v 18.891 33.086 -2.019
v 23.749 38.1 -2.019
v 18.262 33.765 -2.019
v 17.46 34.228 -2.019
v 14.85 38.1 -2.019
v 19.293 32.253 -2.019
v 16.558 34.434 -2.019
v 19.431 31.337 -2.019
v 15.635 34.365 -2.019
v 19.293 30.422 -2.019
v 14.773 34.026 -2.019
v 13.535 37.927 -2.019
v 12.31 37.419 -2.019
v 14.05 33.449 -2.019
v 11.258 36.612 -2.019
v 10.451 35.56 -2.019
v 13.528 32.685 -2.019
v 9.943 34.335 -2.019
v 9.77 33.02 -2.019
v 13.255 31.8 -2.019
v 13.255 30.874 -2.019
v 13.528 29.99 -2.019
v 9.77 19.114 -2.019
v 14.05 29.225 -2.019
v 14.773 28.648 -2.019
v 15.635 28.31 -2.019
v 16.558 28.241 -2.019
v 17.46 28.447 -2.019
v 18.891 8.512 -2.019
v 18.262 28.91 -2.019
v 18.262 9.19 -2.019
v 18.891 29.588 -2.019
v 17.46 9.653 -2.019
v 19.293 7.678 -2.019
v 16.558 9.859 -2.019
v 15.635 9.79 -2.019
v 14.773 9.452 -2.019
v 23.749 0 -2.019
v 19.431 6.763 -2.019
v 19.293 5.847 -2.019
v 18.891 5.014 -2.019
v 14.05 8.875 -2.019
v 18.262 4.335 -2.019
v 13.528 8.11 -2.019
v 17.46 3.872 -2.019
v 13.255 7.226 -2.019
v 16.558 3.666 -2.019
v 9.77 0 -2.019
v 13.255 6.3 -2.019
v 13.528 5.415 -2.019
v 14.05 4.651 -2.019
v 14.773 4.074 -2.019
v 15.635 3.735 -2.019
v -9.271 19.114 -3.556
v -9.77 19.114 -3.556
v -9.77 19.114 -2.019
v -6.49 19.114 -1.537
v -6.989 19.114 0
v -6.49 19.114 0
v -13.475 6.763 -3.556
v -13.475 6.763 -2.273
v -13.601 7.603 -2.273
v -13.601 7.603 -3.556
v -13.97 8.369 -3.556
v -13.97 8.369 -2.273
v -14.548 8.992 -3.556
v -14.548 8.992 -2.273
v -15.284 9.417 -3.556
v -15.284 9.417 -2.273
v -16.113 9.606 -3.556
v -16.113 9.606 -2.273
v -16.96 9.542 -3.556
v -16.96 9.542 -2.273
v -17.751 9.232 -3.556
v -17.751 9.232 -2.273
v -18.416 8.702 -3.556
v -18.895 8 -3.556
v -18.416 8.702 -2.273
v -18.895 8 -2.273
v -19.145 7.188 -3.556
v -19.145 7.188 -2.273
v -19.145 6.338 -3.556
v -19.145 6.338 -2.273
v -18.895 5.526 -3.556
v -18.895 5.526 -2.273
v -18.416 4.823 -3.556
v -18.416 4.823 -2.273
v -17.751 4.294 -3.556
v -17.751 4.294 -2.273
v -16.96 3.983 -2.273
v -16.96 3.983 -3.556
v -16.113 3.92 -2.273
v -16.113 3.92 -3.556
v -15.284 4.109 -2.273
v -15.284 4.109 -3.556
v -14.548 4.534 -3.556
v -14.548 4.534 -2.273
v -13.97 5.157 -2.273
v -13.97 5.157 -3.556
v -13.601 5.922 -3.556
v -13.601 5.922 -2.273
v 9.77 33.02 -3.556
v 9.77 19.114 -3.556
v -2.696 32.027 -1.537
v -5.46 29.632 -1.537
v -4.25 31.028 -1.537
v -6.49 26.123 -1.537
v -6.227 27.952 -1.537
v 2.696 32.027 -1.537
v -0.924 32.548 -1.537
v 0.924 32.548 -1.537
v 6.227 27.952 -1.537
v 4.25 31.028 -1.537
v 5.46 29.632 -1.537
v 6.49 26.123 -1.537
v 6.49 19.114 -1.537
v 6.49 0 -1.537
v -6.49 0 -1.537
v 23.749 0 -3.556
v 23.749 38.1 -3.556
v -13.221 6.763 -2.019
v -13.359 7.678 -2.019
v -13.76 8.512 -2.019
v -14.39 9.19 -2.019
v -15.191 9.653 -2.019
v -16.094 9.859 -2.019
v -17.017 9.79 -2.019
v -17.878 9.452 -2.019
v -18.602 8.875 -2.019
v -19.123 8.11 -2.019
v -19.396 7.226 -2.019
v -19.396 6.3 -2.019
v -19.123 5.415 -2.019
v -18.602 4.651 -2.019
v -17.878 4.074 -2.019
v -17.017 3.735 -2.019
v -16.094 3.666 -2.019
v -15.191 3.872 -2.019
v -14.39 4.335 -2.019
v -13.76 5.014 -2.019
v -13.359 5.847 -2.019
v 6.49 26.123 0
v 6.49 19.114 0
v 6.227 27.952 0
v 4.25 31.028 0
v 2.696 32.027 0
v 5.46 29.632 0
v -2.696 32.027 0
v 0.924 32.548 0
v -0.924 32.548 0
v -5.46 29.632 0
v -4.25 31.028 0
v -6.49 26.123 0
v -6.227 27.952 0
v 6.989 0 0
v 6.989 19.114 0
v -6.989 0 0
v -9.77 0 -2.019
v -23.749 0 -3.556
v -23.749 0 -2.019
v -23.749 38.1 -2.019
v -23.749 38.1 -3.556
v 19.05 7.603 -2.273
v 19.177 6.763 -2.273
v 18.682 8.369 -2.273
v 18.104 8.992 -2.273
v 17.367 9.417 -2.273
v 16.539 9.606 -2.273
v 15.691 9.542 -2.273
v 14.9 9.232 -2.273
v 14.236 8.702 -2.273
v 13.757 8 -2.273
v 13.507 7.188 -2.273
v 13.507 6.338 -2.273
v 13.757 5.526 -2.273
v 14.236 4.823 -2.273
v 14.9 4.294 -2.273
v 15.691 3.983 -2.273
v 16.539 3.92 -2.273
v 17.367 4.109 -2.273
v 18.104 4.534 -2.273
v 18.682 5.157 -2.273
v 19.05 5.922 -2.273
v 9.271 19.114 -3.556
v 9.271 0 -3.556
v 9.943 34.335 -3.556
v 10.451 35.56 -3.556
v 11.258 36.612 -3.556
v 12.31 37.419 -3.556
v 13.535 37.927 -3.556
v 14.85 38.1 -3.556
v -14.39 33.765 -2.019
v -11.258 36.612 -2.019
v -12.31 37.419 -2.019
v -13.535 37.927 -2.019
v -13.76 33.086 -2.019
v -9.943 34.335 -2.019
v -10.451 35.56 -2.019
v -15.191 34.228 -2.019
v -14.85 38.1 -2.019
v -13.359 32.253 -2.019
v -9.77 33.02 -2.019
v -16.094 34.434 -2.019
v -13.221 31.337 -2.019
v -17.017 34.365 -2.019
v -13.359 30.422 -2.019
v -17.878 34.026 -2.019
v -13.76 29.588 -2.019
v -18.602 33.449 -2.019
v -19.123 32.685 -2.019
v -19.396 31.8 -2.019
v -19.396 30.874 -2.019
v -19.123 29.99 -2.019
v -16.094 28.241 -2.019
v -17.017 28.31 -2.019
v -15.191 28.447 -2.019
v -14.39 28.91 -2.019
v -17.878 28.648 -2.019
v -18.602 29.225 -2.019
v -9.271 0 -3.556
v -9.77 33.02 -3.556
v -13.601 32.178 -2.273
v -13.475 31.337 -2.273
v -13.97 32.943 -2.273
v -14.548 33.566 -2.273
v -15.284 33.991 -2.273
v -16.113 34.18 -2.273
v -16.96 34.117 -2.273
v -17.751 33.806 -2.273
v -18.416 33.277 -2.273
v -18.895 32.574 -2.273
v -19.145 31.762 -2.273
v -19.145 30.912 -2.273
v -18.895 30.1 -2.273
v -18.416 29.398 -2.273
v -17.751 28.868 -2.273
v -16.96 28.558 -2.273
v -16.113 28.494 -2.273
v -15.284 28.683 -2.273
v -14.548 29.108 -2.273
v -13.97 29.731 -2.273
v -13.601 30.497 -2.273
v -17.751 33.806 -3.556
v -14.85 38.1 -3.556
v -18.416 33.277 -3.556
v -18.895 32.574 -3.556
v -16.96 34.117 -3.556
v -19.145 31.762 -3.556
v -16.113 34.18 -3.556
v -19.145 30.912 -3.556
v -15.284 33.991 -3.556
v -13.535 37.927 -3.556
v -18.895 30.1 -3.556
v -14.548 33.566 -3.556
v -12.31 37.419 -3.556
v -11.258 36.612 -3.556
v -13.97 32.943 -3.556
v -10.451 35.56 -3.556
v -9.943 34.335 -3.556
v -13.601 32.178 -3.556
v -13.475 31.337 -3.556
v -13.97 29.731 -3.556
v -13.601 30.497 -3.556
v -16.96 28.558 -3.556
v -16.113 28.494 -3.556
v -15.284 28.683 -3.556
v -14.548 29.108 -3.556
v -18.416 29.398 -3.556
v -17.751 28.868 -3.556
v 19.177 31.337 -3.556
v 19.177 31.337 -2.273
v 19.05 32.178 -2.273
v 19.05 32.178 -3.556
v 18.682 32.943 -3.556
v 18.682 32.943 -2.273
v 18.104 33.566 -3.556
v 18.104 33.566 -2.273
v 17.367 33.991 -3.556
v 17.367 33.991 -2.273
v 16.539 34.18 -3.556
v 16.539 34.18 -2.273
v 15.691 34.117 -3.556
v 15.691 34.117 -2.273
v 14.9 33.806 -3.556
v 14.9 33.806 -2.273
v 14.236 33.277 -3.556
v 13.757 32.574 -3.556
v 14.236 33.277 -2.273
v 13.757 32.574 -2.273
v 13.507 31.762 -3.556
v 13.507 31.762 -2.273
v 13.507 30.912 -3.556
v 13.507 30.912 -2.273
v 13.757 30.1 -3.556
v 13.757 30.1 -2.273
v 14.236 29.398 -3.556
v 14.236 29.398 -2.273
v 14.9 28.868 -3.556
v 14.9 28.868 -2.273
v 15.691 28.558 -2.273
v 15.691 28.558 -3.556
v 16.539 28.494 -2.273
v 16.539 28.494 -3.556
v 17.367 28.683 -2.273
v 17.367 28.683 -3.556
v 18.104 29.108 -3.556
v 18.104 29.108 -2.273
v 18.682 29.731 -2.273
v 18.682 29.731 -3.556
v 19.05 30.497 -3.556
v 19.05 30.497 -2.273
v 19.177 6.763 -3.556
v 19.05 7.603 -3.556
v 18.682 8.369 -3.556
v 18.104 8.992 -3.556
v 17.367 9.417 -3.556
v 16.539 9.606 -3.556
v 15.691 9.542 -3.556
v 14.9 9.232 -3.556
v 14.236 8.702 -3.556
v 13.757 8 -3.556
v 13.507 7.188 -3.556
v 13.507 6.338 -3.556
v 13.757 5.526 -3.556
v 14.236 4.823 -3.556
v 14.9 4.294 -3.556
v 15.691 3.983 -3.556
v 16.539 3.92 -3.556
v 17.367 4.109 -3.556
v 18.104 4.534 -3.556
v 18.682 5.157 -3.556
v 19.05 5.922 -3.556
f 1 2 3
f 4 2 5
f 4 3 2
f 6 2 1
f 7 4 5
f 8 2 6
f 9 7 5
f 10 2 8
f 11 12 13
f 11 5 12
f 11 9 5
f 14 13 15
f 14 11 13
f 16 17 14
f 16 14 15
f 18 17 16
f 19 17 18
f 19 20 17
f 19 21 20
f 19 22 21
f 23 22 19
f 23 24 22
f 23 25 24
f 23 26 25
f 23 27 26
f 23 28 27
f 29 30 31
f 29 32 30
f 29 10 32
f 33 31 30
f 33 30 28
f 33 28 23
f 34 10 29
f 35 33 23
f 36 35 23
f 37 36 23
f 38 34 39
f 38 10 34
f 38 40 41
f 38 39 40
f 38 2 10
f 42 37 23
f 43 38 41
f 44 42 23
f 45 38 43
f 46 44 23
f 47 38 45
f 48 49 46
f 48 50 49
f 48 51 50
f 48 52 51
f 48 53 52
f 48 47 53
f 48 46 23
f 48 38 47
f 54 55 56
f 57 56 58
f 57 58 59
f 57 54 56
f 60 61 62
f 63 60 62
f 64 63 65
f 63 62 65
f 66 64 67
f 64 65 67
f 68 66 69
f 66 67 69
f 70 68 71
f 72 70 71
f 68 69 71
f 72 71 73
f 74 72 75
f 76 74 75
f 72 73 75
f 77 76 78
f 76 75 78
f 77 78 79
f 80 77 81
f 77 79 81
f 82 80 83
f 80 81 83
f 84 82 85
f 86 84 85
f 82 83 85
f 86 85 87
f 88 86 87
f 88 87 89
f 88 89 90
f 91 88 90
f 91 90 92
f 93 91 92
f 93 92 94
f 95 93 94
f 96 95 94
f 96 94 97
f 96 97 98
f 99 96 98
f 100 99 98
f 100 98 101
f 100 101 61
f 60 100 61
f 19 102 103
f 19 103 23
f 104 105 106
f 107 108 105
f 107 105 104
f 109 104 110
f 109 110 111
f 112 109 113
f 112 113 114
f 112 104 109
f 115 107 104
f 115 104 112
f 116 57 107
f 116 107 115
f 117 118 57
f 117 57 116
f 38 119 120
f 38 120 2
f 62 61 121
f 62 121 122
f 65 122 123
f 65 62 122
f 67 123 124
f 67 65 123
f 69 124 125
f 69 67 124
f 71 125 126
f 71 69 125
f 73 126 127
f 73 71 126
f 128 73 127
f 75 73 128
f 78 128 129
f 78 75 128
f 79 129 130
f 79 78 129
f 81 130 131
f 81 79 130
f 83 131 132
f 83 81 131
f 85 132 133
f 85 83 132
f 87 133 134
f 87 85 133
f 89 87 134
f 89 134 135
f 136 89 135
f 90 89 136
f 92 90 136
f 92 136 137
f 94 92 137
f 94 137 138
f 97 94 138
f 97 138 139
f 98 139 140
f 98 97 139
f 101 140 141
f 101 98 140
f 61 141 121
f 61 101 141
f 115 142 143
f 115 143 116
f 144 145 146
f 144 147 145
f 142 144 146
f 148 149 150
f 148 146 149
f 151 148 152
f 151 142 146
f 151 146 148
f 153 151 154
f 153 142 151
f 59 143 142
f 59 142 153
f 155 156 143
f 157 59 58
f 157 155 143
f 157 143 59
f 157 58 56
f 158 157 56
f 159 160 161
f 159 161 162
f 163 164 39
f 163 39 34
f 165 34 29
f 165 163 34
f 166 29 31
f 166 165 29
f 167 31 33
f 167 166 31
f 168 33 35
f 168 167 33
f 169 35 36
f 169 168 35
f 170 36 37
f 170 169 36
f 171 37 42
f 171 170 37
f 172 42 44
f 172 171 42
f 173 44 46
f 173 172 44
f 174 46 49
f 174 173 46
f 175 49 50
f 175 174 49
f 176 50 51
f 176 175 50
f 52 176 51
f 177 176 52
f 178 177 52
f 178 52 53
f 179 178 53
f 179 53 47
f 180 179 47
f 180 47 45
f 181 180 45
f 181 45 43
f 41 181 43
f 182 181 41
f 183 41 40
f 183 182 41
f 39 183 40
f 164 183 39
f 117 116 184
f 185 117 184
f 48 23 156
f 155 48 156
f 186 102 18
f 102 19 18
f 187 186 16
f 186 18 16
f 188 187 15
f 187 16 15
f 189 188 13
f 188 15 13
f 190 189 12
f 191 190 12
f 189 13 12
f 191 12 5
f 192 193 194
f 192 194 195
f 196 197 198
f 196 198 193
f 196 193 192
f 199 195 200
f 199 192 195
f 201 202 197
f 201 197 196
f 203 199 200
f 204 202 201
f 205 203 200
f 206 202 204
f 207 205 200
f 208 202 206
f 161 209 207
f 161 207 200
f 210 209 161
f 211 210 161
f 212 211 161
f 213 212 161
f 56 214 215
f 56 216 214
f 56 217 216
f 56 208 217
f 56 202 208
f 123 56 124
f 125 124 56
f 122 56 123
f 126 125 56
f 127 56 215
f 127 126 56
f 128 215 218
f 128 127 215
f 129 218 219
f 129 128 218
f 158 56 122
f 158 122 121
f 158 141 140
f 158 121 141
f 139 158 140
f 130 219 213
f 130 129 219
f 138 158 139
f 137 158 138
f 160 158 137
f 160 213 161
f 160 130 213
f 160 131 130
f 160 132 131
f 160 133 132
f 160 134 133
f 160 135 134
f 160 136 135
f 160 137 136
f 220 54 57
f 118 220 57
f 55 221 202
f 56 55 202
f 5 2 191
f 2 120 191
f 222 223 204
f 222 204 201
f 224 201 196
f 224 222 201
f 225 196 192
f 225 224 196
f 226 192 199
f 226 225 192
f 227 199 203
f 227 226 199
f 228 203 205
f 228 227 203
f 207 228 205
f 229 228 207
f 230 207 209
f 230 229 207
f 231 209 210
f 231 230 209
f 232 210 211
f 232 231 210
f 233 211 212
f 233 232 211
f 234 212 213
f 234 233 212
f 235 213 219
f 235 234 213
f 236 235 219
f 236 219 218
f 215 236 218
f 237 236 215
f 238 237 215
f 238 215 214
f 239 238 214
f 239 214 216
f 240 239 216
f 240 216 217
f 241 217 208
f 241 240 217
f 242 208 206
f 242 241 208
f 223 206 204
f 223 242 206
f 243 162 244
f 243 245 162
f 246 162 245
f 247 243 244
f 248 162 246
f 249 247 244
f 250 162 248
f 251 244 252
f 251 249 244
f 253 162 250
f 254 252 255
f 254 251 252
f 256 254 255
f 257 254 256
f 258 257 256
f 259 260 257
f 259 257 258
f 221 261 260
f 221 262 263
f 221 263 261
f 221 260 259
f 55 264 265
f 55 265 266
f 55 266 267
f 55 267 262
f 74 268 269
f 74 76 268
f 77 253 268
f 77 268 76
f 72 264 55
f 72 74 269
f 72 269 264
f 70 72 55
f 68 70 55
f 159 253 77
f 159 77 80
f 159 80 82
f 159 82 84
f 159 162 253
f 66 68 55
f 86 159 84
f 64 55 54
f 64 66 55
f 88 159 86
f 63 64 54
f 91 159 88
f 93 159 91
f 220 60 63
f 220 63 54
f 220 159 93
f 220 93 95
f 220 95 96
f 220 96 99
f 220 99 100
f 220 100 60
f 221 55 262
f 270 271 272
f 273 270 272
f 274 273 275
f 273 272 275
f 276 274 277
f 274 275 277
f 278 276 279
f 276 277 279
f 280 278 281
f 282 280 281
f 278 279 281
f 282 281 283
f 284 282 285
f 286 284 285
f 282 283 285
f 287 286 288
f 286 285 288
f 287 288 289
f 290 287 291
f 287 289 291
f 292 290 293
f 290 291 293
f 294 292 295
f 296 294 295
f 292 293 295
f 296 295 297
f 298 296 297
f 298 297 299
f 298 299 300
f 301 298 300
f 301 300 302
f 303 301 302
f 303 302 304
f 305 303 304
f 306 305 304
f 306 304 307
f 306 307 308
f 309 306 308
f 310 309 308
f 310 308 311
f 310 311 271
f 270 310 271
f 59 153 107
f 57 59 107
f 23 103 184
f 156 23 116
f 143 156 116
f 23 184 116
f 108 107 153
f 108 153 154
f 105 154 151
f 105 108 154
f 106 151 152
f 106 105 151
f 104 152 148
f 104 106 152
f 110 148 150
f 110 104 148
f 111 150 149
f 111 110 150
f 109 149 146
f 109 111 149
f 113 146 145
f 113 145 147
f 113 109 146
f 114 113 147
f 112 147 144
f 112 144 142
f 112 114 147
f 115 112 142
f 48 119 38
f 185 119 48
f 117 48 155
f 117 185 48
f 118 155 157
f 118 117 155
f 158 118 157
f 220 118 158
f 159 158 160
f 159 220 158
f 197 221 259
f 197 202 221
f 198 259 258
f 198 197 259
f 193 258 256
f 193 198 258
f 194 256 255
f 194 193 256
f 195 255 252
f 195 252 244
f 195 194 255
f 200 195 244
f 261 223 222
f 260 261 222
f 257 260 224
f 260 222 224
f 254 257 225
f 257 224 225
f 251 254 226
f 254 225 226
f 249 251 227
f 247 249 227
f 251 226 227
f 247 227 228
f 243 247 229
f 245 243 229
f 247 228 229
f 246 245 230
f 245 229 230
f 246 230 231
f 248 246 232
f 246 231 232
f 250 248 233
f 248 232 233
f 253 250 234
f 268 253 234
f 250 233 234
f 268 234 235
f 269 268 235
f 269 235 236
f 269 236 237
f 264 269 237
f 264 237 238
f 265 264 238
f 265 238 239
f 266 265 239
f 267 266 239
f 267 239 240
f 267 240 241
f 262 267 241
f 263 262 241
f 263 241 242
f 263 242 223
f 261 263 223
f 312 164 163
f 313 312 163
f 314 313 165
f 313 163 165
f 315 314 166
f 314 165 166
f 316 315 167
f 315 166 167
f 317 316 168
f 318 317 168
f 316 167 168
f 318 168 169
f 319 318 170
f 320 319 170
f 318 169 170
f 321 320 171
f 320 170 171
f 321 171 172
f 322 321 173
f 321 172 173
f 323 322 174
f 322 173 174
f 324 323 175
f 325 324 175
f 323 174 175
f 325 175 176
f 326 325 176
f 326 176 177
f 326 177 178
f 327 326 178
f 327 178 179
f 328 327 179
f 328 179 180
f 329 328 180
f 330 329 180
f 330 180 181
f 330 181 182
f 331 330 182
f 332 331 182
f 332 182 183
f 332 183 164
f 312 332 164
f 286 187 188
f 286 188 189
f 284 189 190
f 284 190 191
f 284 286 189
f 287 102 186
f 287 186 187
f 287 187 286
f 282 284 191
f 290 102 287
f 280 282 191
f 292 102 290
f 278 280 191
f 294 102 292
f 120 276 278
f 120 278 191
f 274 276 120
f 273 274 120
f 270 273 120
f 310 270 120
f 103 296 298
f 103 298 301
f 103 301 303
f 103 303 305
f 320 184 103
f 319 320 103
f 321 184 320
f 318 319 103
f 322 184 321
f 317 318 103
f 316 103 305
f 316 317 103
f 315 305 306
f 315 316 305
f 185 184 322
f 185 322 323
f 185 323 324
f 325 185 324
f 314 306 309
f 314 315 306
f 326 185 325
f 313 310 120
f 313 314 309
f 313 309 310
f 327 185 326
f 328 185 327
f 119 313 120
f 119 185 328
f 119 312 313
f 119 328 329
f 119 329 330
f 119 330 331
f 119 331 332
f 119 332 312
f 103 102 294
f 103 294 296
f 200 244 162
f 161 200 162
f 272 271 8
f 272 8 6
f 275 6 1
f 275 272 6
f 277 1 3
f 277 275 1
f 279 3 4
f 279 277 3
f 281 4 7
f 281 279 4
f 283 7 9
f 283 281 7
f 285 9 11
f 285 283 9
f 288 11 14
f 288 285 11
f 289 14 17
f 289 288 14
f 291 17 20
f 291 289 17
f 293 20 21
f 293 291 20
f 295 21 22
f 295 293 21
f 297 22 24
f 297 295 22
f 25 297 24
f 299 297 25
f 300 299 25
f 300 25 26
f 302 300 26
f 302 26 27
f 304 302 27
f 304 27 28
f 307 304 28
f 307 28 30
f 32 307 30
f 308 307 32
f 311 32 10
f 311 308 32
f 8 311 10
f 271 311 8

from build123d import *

# Parameters (mm, degrees)
BOSS_EXTRUDE1_DEPTH     = 38.1
CUT_EXTRUDE2_DEPTH      = 18.9865
CUT_EXTRUDE4_DEPTH      = 3.0193
CUT_EXTRUDE4_DEPTH_BACK = 2.5367
FILLET3_R               = 5.08
SKETCH8_R               = 2.85115
CUT_EXTRUDE5_DEPTH      = 3.0193
CUT_EXTRUDE5_DEPTH_BACK = 2.5367
CHAMFER1_SIZE           = 0.254


with BuildPart() as part:
    # Sketch1 → Boss-Extrude1 (new body)
    with BuildSketch(Plane(origin=(0, 0, 0), x_dir=(1, 0, 0), z_dir=(0, 1, 0))):
        Polygon((9.770109876, 2.0193), (6.989445062, 0), (-6.989445062, 0), (-9.770109876, 2.0193), (-23.749, 2.0193), (-23.749, 3.556), (-9.271, 3.556), (-6.490335186, 1.5367), (6.490335186, 1.5367), (9.271, 3.556), (23.749, 3.556), (23.749, 2.0193), align=None)
    extrude(amount=BOSS_EXTRUDE1_DEPTH)

    # Sketch3 → Cut-Extrude2 (cut)
    with BuildSketch(Plane(origin=(0, 38.1, 0), x_dir=(1, 0, 0), z_dir=(0, 1, 0))):
        Polygon((-9.770109876, 3.91845022), (-9.770109876, 2.0193), (-6.490335186, -0.36245022), (-6.490335186, 1.5367), align=None)
        Polygon((6.490335186, 1.5367), (9.770109876, 3.91845022), (9.770109876, 2.0193), (6.490335186, -0.36245022), align=None)
    extrude(amount=-CUT_EXTRUDE2_DEPTH, mode=Mode.SUBTRACT)

    # Sketch6 → Cut-Extrude4 (cut, two sides)
    with BuildSketch(Plane(origin=(0, 0, -1.5367), x_dir=(-1, 0, 0), z_dir=(0, 0, -1))) as cut_extrude4_sk:
        with BuildLine():
            Line((-6.490335186, 26.123264814), (-8.408477538, 26.123264814))
            Line((-8.408477538, 26.123264814), (-8.408477538, 40.625106564))
            Line((-8.408477538, 40.625106564), (8.313468388, 40.625106564))
            Line((8.313468388, 40.625106564), (8.313468388, 26.123264814))
            Line((8.313468388, 26.123264814), (6.490335186, 26.123264814))
            ThreePointArc((6.490335186, 26.123264814), (0, 32.6136), (-6.490335186, 26.123264814))
        make_face()
    extrude(amount=CUT_EXTRUDE4_DEPTH, mode=Mode.SUBTRACT)
    extrude(cut_extrude4_sk.sketch, amount=-CUT_EXTRUDE4_DEPTH_BACK, mode=Mode.SUBTRACT)

    # Fillet3
    fillet3_edges = [part.edges().sort_by_distance(p)[0] for p in [
        (-9.770109876, 38.1, -2.78765),
        (9.770109876, 38.1, -2.78765),
    ]]
    fillet(fillet3_edges, radius=FILLET3_R)

    # Sketch8 → Cut-Extrude5 (cut, two sides)
    with BuildSketch(Plane.XY.offset(-2.0193)) as cut_extrude5_sk:
        with Locations((-16.32585, 31.33725)):
            Circle(SKETCH8_R)
        with Locations((-16.32585, 6.76275)):
            Circle(SKETCH8_R)
        with Locations((16.32585, 6.76275)):
            Circle(SKETCH8_R)
        with Locations((16.32585, 31.33725)):
            Circle(SKETCH8_R)
    extrude(amount=CUT_EXTRUDE5_DEPTH, mode=Mode.SUBTRACT)
    extrude(cut_extrude5_sk.sketch, amount=-CUT_EXTRUDE5_DEPTH_BACK, mode=Mode.SUBTRACT)

    # Chamfer1
    chamfer1_edges = [part.edges().sort_by_distance(p)[0] for p in [
        (-19.177, 31.33725, -2.0193),
        (-19.177, 6.76275, -2.0193),
        (13.4747, 6.76275, -2.0193),
        (13.4747, 31.33725, -2.0193),
    ]]
    chamfer(chamfer1_edges, length=CHAMFER1_SIZE)


solid = part.part
